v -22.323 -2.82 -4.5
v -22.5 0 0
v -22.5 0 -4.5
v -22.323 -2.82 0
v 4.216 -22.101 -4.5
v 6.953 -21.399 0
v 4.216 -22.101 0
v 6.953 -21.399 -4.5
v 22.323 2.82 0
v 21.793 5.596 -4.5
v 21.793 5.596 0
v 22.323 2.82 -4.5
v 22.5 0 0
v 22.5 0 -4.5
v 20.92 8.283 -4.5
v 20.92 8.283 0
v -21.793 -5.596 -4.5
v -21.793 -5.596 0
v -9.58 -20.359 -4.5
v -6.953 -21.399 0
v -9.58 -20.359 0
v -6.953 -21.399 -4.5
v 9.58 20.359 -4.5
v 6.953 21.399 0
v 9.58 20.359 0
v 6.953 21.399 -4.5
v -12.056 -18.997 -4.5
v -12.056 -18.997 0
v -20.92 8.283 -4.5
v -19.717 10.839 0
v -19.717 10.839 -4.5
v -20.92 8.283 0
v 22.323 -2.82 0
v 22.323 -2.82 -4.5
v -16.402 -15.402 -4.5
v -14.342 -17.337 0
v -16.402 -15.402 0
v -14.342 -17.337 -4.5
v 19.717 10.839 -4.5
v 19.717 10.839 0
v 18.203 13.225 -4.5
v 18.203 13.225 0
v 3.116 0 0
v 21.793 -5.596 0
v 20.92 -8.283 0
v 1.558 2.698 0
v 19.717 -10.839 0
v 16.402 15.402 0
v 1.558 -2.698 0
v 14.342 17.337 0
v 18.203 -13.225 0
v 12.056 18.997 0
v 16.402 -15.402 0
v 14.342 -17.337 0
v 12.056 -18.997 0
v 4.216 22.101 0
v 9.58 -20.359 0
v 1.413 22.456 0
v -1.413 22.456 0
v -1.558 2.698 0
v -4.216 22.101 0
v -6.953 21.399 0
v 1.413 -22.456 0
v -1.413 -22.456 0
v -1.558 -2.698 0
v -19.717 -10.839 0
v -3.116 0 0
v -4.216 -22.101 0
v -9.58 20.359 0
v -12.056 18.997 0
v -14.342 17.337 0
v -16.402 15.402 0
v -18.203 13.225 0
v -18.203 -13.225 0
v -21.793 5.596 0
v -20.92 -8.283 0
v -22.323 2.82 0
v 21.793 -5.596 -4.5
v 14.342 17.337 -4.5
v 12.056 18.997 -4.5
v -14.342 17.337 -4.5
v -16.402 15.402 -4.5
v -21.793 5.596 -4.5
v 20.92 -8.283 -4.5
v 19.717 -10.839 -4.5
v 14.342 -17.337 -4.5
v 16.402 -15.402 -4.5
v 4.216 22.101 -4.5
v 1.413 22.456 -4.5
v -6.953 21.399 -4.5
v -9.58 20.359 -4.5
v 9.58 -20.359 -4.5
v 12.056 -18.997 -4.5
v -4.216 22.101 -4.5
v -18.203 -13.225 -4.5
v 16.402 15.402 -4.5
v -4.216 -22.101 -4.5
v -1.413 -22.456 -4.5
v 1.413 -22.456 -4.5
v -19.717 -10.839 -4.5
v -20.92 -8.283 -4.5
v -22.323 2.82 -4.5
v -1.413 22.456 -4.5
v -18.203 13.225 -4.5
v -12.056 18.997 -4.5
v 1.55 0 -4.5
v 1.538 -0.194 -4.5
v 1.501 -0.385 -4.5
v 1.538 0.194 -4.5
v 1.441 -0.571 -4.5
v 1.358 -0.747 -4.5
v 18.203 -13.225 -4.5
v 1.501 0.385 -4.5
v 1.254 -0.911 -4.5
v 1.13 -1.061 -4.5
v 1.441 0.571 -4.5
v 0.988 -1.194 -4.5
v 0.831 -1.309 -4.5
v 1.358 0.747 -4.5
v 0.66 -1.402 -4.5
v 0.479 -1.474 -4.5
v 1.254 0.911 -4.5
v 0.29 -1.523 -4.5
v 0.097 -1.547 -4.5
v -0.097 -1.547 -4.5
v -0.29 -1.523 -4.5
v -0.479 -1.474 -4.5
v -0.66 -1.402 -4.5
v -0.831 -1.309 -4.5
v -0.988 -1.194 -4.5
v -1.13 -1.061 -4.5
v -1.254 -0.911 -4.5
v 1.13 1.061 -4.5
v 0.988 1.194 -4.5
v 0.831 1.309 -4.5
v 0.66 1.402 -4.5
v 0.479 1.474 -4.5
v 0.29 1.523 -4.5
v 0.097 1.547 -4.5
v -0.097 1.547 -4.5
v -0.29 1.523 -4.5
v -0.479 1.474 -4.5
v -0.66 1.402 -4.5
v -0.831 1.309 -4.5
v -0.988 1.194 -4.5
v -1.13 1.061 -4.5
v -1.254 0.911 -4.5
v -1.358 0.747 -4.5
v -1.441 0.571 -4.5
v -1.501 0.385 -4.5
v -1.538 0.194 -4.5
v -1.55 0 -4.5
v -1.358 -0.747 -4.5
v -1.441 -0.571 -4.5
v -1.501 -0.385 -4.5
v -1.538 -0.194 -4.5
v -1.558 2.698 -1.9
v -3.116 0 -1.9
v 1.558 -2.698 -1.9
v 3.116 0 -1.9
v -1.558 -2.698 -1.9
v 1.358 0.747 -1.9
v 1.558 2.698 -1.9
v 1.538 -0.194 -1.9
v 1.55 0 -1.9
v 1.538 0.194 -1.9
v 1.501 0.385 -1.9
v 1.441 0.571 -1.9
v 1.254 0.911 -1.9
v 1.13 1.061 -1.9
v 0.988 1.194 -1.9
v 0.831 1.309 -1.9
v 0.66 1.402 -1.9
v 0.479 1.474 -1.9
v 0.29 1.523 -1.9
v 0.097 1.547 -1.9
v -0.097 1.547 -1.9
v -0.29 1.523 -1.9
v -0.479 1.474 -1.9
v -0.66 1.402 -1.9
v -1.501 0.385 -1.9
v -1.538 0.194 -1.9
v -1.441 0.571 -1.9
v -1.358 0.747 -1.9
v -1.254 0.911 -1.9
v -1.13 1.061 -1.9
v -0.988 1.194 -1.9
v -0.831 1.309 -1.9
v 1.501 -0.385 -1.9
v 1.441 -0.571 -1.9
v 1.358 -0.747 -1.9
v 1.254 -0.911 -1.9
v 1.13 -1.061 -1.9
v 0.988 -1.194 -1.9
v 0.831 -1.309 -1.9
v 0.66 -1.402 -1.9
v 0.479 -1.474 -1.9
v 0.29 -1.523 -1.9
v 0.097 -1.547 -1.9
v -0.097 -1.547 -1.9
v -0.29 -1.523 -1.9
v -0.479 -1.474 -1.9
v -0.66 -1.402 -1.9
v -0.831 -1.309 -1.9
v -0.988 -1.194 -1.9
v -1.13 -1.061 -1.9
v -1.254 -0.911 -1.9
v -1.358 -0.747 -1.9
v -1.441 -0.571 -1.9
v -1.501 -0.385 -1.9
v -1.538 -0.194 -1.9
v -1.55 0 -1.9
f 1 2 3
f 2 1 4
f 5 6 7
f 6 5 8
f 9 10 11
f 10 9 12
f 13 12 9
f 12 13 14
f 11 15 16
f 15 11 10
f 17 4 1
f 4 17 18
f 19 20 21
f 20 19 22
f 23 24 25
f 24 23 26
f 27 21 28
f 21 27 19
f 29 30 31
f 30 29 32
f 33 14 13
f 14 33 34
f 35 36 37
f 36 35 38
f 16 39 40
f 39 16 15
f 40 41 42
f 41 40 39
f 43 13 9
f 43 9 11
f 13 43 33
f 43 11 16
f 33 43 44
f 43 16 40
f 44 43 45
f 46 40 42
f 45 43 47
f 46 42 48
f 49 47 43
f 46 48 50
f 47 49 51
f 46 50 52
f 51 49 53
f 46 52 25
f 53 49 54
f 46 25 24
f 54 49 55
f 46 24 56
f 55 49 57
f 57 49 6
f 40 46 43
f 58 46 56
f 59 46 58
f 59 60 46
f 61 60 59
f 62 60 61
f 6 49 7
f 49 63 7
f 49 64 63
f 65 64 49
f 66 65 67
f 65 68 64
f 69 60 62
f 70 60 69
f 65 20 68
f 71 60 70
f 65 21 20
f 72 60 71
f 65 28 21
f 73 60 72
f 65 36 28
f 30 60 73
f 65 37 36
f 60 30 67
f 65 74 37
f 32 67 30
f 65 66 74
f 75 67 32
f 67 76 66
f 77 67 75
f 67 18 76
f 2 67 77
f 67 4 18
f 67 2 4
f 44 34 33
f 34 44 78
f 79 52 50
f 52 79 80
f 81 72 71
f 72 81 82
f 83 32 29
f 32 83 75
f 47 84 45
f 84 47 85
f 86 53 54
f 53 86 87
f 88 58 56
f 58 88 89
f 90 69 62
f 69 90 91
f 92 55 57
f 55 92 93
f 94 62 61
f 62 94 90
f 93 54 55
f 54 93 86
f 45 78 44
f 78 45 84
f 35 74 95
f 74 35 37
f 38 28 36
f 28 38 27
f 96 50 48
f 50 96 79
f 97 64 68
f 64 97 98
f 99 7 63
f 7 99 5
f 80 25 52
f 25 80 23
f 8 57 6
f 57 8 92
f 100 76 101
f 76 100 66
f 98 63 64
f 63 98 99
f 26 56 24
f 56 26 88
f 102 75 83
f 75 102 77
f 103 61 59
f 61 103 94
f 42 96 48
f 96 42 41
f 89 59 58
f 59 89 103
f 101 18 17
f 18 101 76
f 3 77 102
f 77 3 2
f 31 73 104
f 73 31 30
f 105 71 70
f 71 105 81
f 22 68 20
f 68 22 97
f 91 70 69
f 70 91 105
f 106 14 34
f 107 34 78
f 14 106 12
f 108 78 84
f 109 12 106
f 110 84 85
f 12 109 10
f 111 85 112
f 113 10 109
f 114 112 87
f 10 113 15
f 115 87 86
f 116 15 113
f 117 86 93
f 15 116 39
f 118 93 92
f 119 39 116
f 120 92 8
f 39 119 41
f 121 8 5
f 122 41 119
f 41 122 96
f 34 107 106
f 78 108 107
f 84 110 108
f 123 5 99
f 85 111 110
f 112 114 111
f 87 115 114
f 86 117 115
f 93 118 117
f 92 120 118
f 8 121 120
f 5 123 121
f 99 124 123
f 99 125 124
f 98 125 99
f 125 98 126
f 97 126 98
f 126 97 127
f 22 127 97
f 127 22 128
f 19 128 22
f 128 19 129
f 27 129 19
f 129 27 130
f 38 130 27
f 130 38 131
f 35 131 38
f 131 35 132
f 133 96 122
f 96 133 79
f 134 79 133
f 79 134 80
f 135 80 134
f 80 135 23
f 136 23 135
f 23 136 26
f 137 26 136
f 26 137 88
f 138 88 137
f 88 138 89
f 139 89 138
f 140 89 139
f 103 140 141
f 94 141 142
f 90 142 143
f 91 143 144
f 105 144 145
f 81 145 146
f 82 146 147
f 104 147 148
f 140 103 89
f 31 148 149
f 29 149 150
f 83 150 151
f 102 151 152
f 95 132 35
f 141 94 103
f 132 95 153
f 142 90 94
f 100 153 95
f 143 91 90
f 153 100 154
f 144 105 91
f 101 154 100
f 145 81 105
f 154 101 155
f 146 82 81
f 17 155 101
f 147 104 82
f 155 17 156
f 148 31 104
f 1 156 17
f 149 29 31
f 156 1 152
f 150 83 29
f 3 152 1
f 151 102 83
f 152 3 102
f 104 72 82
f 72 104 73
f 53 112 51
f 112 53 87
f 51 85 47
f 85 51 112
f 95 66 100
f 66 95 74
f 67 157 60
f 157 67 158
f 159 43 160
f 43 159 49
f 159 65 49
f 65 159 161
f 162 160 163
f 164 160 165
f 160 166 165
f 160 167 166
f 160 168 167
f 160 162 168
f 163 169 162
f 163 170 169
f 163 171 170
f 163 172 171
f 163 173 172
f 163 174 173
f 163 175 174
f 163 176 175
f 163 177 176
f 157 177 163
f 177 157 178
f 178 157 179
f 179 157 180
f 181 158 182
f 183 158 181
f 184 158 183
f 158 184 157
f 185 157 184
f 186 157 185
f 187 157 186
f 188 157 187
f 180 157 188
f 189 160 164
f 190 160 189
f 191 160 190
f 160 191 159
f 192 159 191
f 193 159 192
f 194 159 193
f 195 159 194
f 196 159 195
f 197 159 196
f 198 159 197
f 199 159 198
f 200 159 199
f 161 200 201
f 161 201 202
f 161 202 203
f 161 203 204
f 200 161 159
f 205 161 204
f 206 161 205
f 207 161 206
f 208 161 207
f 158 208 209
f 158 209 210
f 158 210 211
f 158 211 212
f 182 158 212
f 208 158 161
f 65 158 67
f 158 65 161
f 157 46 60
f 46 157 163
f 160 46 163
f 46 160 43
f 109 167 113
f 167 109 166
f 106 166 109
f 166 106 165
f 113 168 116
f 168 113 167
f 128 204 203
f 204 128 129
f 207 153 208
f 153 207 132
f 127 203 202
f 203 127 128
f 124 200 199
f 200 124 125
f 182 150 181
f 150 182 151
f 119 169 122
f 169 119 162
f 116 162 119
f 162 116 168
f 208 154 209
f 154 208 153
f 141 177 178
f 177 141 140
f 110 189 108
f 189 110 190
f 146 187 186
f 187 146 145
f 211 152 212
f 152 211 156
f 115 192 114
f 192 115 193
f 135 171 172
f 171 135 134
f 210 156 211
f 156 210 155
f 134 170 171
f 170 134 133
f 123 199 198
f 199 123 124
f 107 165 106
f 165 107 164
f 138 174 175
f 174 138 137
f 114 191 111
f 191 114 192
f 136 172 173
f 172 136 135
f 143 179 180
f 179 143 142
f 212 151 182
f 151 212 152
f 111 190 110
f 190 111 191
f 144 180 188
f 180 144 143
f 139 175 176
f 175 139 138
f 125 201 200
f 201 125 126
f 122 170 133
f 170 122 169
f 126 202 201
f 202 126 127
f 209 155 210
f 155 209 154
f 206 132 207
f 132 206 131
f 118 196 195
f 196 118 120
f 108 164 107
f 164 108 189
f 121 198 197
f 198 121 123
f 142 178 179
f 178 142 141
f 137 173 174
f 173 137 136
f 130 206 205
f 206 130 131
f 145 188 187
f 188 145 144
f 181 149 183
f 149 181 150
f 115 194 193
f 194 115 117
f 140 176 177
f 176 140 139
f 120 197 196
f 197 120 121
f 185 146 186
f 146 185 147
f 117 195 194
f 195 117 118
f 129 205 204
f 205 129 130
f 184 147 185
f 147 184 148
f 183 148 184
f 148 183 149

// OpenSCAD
$fn = 50;


difference() {
	union() {
		translate(v = [0, 0, -4.5000000000]) {
			cylinder(h = 4.5000000000, r = 22.5000000000);
		}
		translate(v = [0, 0, -3.0000000000]) {
			cylinder(h = 3, r = 2.8750000000);
		}
	}
	union() {
		translate(v = [0, 0, 0]) {
			rotate(a = [0, 0, 0]) {
				difference() {
					union() {
						translate(v = [0, 0, -1.9000000000]) {
							linear_extrude(height = 1.9000000000) {
								polygon(points = [[3.1158000000, 0.0000000000], [1.5579000000, 2.6983619531], [-1.5579000000, 2.6983619531], [-3.1158000000, 0.0000000000], [-1.5579000000, -2.6983619531], [1.5579000000, -2.6983619531]]);
							}
						}
					}
					union();
				}
			}
		}
		#translate(v = [0, 0, -100.0000000000]) {
			cylinder(h = 200, r = 1.5500000000);
		}
	}
}
